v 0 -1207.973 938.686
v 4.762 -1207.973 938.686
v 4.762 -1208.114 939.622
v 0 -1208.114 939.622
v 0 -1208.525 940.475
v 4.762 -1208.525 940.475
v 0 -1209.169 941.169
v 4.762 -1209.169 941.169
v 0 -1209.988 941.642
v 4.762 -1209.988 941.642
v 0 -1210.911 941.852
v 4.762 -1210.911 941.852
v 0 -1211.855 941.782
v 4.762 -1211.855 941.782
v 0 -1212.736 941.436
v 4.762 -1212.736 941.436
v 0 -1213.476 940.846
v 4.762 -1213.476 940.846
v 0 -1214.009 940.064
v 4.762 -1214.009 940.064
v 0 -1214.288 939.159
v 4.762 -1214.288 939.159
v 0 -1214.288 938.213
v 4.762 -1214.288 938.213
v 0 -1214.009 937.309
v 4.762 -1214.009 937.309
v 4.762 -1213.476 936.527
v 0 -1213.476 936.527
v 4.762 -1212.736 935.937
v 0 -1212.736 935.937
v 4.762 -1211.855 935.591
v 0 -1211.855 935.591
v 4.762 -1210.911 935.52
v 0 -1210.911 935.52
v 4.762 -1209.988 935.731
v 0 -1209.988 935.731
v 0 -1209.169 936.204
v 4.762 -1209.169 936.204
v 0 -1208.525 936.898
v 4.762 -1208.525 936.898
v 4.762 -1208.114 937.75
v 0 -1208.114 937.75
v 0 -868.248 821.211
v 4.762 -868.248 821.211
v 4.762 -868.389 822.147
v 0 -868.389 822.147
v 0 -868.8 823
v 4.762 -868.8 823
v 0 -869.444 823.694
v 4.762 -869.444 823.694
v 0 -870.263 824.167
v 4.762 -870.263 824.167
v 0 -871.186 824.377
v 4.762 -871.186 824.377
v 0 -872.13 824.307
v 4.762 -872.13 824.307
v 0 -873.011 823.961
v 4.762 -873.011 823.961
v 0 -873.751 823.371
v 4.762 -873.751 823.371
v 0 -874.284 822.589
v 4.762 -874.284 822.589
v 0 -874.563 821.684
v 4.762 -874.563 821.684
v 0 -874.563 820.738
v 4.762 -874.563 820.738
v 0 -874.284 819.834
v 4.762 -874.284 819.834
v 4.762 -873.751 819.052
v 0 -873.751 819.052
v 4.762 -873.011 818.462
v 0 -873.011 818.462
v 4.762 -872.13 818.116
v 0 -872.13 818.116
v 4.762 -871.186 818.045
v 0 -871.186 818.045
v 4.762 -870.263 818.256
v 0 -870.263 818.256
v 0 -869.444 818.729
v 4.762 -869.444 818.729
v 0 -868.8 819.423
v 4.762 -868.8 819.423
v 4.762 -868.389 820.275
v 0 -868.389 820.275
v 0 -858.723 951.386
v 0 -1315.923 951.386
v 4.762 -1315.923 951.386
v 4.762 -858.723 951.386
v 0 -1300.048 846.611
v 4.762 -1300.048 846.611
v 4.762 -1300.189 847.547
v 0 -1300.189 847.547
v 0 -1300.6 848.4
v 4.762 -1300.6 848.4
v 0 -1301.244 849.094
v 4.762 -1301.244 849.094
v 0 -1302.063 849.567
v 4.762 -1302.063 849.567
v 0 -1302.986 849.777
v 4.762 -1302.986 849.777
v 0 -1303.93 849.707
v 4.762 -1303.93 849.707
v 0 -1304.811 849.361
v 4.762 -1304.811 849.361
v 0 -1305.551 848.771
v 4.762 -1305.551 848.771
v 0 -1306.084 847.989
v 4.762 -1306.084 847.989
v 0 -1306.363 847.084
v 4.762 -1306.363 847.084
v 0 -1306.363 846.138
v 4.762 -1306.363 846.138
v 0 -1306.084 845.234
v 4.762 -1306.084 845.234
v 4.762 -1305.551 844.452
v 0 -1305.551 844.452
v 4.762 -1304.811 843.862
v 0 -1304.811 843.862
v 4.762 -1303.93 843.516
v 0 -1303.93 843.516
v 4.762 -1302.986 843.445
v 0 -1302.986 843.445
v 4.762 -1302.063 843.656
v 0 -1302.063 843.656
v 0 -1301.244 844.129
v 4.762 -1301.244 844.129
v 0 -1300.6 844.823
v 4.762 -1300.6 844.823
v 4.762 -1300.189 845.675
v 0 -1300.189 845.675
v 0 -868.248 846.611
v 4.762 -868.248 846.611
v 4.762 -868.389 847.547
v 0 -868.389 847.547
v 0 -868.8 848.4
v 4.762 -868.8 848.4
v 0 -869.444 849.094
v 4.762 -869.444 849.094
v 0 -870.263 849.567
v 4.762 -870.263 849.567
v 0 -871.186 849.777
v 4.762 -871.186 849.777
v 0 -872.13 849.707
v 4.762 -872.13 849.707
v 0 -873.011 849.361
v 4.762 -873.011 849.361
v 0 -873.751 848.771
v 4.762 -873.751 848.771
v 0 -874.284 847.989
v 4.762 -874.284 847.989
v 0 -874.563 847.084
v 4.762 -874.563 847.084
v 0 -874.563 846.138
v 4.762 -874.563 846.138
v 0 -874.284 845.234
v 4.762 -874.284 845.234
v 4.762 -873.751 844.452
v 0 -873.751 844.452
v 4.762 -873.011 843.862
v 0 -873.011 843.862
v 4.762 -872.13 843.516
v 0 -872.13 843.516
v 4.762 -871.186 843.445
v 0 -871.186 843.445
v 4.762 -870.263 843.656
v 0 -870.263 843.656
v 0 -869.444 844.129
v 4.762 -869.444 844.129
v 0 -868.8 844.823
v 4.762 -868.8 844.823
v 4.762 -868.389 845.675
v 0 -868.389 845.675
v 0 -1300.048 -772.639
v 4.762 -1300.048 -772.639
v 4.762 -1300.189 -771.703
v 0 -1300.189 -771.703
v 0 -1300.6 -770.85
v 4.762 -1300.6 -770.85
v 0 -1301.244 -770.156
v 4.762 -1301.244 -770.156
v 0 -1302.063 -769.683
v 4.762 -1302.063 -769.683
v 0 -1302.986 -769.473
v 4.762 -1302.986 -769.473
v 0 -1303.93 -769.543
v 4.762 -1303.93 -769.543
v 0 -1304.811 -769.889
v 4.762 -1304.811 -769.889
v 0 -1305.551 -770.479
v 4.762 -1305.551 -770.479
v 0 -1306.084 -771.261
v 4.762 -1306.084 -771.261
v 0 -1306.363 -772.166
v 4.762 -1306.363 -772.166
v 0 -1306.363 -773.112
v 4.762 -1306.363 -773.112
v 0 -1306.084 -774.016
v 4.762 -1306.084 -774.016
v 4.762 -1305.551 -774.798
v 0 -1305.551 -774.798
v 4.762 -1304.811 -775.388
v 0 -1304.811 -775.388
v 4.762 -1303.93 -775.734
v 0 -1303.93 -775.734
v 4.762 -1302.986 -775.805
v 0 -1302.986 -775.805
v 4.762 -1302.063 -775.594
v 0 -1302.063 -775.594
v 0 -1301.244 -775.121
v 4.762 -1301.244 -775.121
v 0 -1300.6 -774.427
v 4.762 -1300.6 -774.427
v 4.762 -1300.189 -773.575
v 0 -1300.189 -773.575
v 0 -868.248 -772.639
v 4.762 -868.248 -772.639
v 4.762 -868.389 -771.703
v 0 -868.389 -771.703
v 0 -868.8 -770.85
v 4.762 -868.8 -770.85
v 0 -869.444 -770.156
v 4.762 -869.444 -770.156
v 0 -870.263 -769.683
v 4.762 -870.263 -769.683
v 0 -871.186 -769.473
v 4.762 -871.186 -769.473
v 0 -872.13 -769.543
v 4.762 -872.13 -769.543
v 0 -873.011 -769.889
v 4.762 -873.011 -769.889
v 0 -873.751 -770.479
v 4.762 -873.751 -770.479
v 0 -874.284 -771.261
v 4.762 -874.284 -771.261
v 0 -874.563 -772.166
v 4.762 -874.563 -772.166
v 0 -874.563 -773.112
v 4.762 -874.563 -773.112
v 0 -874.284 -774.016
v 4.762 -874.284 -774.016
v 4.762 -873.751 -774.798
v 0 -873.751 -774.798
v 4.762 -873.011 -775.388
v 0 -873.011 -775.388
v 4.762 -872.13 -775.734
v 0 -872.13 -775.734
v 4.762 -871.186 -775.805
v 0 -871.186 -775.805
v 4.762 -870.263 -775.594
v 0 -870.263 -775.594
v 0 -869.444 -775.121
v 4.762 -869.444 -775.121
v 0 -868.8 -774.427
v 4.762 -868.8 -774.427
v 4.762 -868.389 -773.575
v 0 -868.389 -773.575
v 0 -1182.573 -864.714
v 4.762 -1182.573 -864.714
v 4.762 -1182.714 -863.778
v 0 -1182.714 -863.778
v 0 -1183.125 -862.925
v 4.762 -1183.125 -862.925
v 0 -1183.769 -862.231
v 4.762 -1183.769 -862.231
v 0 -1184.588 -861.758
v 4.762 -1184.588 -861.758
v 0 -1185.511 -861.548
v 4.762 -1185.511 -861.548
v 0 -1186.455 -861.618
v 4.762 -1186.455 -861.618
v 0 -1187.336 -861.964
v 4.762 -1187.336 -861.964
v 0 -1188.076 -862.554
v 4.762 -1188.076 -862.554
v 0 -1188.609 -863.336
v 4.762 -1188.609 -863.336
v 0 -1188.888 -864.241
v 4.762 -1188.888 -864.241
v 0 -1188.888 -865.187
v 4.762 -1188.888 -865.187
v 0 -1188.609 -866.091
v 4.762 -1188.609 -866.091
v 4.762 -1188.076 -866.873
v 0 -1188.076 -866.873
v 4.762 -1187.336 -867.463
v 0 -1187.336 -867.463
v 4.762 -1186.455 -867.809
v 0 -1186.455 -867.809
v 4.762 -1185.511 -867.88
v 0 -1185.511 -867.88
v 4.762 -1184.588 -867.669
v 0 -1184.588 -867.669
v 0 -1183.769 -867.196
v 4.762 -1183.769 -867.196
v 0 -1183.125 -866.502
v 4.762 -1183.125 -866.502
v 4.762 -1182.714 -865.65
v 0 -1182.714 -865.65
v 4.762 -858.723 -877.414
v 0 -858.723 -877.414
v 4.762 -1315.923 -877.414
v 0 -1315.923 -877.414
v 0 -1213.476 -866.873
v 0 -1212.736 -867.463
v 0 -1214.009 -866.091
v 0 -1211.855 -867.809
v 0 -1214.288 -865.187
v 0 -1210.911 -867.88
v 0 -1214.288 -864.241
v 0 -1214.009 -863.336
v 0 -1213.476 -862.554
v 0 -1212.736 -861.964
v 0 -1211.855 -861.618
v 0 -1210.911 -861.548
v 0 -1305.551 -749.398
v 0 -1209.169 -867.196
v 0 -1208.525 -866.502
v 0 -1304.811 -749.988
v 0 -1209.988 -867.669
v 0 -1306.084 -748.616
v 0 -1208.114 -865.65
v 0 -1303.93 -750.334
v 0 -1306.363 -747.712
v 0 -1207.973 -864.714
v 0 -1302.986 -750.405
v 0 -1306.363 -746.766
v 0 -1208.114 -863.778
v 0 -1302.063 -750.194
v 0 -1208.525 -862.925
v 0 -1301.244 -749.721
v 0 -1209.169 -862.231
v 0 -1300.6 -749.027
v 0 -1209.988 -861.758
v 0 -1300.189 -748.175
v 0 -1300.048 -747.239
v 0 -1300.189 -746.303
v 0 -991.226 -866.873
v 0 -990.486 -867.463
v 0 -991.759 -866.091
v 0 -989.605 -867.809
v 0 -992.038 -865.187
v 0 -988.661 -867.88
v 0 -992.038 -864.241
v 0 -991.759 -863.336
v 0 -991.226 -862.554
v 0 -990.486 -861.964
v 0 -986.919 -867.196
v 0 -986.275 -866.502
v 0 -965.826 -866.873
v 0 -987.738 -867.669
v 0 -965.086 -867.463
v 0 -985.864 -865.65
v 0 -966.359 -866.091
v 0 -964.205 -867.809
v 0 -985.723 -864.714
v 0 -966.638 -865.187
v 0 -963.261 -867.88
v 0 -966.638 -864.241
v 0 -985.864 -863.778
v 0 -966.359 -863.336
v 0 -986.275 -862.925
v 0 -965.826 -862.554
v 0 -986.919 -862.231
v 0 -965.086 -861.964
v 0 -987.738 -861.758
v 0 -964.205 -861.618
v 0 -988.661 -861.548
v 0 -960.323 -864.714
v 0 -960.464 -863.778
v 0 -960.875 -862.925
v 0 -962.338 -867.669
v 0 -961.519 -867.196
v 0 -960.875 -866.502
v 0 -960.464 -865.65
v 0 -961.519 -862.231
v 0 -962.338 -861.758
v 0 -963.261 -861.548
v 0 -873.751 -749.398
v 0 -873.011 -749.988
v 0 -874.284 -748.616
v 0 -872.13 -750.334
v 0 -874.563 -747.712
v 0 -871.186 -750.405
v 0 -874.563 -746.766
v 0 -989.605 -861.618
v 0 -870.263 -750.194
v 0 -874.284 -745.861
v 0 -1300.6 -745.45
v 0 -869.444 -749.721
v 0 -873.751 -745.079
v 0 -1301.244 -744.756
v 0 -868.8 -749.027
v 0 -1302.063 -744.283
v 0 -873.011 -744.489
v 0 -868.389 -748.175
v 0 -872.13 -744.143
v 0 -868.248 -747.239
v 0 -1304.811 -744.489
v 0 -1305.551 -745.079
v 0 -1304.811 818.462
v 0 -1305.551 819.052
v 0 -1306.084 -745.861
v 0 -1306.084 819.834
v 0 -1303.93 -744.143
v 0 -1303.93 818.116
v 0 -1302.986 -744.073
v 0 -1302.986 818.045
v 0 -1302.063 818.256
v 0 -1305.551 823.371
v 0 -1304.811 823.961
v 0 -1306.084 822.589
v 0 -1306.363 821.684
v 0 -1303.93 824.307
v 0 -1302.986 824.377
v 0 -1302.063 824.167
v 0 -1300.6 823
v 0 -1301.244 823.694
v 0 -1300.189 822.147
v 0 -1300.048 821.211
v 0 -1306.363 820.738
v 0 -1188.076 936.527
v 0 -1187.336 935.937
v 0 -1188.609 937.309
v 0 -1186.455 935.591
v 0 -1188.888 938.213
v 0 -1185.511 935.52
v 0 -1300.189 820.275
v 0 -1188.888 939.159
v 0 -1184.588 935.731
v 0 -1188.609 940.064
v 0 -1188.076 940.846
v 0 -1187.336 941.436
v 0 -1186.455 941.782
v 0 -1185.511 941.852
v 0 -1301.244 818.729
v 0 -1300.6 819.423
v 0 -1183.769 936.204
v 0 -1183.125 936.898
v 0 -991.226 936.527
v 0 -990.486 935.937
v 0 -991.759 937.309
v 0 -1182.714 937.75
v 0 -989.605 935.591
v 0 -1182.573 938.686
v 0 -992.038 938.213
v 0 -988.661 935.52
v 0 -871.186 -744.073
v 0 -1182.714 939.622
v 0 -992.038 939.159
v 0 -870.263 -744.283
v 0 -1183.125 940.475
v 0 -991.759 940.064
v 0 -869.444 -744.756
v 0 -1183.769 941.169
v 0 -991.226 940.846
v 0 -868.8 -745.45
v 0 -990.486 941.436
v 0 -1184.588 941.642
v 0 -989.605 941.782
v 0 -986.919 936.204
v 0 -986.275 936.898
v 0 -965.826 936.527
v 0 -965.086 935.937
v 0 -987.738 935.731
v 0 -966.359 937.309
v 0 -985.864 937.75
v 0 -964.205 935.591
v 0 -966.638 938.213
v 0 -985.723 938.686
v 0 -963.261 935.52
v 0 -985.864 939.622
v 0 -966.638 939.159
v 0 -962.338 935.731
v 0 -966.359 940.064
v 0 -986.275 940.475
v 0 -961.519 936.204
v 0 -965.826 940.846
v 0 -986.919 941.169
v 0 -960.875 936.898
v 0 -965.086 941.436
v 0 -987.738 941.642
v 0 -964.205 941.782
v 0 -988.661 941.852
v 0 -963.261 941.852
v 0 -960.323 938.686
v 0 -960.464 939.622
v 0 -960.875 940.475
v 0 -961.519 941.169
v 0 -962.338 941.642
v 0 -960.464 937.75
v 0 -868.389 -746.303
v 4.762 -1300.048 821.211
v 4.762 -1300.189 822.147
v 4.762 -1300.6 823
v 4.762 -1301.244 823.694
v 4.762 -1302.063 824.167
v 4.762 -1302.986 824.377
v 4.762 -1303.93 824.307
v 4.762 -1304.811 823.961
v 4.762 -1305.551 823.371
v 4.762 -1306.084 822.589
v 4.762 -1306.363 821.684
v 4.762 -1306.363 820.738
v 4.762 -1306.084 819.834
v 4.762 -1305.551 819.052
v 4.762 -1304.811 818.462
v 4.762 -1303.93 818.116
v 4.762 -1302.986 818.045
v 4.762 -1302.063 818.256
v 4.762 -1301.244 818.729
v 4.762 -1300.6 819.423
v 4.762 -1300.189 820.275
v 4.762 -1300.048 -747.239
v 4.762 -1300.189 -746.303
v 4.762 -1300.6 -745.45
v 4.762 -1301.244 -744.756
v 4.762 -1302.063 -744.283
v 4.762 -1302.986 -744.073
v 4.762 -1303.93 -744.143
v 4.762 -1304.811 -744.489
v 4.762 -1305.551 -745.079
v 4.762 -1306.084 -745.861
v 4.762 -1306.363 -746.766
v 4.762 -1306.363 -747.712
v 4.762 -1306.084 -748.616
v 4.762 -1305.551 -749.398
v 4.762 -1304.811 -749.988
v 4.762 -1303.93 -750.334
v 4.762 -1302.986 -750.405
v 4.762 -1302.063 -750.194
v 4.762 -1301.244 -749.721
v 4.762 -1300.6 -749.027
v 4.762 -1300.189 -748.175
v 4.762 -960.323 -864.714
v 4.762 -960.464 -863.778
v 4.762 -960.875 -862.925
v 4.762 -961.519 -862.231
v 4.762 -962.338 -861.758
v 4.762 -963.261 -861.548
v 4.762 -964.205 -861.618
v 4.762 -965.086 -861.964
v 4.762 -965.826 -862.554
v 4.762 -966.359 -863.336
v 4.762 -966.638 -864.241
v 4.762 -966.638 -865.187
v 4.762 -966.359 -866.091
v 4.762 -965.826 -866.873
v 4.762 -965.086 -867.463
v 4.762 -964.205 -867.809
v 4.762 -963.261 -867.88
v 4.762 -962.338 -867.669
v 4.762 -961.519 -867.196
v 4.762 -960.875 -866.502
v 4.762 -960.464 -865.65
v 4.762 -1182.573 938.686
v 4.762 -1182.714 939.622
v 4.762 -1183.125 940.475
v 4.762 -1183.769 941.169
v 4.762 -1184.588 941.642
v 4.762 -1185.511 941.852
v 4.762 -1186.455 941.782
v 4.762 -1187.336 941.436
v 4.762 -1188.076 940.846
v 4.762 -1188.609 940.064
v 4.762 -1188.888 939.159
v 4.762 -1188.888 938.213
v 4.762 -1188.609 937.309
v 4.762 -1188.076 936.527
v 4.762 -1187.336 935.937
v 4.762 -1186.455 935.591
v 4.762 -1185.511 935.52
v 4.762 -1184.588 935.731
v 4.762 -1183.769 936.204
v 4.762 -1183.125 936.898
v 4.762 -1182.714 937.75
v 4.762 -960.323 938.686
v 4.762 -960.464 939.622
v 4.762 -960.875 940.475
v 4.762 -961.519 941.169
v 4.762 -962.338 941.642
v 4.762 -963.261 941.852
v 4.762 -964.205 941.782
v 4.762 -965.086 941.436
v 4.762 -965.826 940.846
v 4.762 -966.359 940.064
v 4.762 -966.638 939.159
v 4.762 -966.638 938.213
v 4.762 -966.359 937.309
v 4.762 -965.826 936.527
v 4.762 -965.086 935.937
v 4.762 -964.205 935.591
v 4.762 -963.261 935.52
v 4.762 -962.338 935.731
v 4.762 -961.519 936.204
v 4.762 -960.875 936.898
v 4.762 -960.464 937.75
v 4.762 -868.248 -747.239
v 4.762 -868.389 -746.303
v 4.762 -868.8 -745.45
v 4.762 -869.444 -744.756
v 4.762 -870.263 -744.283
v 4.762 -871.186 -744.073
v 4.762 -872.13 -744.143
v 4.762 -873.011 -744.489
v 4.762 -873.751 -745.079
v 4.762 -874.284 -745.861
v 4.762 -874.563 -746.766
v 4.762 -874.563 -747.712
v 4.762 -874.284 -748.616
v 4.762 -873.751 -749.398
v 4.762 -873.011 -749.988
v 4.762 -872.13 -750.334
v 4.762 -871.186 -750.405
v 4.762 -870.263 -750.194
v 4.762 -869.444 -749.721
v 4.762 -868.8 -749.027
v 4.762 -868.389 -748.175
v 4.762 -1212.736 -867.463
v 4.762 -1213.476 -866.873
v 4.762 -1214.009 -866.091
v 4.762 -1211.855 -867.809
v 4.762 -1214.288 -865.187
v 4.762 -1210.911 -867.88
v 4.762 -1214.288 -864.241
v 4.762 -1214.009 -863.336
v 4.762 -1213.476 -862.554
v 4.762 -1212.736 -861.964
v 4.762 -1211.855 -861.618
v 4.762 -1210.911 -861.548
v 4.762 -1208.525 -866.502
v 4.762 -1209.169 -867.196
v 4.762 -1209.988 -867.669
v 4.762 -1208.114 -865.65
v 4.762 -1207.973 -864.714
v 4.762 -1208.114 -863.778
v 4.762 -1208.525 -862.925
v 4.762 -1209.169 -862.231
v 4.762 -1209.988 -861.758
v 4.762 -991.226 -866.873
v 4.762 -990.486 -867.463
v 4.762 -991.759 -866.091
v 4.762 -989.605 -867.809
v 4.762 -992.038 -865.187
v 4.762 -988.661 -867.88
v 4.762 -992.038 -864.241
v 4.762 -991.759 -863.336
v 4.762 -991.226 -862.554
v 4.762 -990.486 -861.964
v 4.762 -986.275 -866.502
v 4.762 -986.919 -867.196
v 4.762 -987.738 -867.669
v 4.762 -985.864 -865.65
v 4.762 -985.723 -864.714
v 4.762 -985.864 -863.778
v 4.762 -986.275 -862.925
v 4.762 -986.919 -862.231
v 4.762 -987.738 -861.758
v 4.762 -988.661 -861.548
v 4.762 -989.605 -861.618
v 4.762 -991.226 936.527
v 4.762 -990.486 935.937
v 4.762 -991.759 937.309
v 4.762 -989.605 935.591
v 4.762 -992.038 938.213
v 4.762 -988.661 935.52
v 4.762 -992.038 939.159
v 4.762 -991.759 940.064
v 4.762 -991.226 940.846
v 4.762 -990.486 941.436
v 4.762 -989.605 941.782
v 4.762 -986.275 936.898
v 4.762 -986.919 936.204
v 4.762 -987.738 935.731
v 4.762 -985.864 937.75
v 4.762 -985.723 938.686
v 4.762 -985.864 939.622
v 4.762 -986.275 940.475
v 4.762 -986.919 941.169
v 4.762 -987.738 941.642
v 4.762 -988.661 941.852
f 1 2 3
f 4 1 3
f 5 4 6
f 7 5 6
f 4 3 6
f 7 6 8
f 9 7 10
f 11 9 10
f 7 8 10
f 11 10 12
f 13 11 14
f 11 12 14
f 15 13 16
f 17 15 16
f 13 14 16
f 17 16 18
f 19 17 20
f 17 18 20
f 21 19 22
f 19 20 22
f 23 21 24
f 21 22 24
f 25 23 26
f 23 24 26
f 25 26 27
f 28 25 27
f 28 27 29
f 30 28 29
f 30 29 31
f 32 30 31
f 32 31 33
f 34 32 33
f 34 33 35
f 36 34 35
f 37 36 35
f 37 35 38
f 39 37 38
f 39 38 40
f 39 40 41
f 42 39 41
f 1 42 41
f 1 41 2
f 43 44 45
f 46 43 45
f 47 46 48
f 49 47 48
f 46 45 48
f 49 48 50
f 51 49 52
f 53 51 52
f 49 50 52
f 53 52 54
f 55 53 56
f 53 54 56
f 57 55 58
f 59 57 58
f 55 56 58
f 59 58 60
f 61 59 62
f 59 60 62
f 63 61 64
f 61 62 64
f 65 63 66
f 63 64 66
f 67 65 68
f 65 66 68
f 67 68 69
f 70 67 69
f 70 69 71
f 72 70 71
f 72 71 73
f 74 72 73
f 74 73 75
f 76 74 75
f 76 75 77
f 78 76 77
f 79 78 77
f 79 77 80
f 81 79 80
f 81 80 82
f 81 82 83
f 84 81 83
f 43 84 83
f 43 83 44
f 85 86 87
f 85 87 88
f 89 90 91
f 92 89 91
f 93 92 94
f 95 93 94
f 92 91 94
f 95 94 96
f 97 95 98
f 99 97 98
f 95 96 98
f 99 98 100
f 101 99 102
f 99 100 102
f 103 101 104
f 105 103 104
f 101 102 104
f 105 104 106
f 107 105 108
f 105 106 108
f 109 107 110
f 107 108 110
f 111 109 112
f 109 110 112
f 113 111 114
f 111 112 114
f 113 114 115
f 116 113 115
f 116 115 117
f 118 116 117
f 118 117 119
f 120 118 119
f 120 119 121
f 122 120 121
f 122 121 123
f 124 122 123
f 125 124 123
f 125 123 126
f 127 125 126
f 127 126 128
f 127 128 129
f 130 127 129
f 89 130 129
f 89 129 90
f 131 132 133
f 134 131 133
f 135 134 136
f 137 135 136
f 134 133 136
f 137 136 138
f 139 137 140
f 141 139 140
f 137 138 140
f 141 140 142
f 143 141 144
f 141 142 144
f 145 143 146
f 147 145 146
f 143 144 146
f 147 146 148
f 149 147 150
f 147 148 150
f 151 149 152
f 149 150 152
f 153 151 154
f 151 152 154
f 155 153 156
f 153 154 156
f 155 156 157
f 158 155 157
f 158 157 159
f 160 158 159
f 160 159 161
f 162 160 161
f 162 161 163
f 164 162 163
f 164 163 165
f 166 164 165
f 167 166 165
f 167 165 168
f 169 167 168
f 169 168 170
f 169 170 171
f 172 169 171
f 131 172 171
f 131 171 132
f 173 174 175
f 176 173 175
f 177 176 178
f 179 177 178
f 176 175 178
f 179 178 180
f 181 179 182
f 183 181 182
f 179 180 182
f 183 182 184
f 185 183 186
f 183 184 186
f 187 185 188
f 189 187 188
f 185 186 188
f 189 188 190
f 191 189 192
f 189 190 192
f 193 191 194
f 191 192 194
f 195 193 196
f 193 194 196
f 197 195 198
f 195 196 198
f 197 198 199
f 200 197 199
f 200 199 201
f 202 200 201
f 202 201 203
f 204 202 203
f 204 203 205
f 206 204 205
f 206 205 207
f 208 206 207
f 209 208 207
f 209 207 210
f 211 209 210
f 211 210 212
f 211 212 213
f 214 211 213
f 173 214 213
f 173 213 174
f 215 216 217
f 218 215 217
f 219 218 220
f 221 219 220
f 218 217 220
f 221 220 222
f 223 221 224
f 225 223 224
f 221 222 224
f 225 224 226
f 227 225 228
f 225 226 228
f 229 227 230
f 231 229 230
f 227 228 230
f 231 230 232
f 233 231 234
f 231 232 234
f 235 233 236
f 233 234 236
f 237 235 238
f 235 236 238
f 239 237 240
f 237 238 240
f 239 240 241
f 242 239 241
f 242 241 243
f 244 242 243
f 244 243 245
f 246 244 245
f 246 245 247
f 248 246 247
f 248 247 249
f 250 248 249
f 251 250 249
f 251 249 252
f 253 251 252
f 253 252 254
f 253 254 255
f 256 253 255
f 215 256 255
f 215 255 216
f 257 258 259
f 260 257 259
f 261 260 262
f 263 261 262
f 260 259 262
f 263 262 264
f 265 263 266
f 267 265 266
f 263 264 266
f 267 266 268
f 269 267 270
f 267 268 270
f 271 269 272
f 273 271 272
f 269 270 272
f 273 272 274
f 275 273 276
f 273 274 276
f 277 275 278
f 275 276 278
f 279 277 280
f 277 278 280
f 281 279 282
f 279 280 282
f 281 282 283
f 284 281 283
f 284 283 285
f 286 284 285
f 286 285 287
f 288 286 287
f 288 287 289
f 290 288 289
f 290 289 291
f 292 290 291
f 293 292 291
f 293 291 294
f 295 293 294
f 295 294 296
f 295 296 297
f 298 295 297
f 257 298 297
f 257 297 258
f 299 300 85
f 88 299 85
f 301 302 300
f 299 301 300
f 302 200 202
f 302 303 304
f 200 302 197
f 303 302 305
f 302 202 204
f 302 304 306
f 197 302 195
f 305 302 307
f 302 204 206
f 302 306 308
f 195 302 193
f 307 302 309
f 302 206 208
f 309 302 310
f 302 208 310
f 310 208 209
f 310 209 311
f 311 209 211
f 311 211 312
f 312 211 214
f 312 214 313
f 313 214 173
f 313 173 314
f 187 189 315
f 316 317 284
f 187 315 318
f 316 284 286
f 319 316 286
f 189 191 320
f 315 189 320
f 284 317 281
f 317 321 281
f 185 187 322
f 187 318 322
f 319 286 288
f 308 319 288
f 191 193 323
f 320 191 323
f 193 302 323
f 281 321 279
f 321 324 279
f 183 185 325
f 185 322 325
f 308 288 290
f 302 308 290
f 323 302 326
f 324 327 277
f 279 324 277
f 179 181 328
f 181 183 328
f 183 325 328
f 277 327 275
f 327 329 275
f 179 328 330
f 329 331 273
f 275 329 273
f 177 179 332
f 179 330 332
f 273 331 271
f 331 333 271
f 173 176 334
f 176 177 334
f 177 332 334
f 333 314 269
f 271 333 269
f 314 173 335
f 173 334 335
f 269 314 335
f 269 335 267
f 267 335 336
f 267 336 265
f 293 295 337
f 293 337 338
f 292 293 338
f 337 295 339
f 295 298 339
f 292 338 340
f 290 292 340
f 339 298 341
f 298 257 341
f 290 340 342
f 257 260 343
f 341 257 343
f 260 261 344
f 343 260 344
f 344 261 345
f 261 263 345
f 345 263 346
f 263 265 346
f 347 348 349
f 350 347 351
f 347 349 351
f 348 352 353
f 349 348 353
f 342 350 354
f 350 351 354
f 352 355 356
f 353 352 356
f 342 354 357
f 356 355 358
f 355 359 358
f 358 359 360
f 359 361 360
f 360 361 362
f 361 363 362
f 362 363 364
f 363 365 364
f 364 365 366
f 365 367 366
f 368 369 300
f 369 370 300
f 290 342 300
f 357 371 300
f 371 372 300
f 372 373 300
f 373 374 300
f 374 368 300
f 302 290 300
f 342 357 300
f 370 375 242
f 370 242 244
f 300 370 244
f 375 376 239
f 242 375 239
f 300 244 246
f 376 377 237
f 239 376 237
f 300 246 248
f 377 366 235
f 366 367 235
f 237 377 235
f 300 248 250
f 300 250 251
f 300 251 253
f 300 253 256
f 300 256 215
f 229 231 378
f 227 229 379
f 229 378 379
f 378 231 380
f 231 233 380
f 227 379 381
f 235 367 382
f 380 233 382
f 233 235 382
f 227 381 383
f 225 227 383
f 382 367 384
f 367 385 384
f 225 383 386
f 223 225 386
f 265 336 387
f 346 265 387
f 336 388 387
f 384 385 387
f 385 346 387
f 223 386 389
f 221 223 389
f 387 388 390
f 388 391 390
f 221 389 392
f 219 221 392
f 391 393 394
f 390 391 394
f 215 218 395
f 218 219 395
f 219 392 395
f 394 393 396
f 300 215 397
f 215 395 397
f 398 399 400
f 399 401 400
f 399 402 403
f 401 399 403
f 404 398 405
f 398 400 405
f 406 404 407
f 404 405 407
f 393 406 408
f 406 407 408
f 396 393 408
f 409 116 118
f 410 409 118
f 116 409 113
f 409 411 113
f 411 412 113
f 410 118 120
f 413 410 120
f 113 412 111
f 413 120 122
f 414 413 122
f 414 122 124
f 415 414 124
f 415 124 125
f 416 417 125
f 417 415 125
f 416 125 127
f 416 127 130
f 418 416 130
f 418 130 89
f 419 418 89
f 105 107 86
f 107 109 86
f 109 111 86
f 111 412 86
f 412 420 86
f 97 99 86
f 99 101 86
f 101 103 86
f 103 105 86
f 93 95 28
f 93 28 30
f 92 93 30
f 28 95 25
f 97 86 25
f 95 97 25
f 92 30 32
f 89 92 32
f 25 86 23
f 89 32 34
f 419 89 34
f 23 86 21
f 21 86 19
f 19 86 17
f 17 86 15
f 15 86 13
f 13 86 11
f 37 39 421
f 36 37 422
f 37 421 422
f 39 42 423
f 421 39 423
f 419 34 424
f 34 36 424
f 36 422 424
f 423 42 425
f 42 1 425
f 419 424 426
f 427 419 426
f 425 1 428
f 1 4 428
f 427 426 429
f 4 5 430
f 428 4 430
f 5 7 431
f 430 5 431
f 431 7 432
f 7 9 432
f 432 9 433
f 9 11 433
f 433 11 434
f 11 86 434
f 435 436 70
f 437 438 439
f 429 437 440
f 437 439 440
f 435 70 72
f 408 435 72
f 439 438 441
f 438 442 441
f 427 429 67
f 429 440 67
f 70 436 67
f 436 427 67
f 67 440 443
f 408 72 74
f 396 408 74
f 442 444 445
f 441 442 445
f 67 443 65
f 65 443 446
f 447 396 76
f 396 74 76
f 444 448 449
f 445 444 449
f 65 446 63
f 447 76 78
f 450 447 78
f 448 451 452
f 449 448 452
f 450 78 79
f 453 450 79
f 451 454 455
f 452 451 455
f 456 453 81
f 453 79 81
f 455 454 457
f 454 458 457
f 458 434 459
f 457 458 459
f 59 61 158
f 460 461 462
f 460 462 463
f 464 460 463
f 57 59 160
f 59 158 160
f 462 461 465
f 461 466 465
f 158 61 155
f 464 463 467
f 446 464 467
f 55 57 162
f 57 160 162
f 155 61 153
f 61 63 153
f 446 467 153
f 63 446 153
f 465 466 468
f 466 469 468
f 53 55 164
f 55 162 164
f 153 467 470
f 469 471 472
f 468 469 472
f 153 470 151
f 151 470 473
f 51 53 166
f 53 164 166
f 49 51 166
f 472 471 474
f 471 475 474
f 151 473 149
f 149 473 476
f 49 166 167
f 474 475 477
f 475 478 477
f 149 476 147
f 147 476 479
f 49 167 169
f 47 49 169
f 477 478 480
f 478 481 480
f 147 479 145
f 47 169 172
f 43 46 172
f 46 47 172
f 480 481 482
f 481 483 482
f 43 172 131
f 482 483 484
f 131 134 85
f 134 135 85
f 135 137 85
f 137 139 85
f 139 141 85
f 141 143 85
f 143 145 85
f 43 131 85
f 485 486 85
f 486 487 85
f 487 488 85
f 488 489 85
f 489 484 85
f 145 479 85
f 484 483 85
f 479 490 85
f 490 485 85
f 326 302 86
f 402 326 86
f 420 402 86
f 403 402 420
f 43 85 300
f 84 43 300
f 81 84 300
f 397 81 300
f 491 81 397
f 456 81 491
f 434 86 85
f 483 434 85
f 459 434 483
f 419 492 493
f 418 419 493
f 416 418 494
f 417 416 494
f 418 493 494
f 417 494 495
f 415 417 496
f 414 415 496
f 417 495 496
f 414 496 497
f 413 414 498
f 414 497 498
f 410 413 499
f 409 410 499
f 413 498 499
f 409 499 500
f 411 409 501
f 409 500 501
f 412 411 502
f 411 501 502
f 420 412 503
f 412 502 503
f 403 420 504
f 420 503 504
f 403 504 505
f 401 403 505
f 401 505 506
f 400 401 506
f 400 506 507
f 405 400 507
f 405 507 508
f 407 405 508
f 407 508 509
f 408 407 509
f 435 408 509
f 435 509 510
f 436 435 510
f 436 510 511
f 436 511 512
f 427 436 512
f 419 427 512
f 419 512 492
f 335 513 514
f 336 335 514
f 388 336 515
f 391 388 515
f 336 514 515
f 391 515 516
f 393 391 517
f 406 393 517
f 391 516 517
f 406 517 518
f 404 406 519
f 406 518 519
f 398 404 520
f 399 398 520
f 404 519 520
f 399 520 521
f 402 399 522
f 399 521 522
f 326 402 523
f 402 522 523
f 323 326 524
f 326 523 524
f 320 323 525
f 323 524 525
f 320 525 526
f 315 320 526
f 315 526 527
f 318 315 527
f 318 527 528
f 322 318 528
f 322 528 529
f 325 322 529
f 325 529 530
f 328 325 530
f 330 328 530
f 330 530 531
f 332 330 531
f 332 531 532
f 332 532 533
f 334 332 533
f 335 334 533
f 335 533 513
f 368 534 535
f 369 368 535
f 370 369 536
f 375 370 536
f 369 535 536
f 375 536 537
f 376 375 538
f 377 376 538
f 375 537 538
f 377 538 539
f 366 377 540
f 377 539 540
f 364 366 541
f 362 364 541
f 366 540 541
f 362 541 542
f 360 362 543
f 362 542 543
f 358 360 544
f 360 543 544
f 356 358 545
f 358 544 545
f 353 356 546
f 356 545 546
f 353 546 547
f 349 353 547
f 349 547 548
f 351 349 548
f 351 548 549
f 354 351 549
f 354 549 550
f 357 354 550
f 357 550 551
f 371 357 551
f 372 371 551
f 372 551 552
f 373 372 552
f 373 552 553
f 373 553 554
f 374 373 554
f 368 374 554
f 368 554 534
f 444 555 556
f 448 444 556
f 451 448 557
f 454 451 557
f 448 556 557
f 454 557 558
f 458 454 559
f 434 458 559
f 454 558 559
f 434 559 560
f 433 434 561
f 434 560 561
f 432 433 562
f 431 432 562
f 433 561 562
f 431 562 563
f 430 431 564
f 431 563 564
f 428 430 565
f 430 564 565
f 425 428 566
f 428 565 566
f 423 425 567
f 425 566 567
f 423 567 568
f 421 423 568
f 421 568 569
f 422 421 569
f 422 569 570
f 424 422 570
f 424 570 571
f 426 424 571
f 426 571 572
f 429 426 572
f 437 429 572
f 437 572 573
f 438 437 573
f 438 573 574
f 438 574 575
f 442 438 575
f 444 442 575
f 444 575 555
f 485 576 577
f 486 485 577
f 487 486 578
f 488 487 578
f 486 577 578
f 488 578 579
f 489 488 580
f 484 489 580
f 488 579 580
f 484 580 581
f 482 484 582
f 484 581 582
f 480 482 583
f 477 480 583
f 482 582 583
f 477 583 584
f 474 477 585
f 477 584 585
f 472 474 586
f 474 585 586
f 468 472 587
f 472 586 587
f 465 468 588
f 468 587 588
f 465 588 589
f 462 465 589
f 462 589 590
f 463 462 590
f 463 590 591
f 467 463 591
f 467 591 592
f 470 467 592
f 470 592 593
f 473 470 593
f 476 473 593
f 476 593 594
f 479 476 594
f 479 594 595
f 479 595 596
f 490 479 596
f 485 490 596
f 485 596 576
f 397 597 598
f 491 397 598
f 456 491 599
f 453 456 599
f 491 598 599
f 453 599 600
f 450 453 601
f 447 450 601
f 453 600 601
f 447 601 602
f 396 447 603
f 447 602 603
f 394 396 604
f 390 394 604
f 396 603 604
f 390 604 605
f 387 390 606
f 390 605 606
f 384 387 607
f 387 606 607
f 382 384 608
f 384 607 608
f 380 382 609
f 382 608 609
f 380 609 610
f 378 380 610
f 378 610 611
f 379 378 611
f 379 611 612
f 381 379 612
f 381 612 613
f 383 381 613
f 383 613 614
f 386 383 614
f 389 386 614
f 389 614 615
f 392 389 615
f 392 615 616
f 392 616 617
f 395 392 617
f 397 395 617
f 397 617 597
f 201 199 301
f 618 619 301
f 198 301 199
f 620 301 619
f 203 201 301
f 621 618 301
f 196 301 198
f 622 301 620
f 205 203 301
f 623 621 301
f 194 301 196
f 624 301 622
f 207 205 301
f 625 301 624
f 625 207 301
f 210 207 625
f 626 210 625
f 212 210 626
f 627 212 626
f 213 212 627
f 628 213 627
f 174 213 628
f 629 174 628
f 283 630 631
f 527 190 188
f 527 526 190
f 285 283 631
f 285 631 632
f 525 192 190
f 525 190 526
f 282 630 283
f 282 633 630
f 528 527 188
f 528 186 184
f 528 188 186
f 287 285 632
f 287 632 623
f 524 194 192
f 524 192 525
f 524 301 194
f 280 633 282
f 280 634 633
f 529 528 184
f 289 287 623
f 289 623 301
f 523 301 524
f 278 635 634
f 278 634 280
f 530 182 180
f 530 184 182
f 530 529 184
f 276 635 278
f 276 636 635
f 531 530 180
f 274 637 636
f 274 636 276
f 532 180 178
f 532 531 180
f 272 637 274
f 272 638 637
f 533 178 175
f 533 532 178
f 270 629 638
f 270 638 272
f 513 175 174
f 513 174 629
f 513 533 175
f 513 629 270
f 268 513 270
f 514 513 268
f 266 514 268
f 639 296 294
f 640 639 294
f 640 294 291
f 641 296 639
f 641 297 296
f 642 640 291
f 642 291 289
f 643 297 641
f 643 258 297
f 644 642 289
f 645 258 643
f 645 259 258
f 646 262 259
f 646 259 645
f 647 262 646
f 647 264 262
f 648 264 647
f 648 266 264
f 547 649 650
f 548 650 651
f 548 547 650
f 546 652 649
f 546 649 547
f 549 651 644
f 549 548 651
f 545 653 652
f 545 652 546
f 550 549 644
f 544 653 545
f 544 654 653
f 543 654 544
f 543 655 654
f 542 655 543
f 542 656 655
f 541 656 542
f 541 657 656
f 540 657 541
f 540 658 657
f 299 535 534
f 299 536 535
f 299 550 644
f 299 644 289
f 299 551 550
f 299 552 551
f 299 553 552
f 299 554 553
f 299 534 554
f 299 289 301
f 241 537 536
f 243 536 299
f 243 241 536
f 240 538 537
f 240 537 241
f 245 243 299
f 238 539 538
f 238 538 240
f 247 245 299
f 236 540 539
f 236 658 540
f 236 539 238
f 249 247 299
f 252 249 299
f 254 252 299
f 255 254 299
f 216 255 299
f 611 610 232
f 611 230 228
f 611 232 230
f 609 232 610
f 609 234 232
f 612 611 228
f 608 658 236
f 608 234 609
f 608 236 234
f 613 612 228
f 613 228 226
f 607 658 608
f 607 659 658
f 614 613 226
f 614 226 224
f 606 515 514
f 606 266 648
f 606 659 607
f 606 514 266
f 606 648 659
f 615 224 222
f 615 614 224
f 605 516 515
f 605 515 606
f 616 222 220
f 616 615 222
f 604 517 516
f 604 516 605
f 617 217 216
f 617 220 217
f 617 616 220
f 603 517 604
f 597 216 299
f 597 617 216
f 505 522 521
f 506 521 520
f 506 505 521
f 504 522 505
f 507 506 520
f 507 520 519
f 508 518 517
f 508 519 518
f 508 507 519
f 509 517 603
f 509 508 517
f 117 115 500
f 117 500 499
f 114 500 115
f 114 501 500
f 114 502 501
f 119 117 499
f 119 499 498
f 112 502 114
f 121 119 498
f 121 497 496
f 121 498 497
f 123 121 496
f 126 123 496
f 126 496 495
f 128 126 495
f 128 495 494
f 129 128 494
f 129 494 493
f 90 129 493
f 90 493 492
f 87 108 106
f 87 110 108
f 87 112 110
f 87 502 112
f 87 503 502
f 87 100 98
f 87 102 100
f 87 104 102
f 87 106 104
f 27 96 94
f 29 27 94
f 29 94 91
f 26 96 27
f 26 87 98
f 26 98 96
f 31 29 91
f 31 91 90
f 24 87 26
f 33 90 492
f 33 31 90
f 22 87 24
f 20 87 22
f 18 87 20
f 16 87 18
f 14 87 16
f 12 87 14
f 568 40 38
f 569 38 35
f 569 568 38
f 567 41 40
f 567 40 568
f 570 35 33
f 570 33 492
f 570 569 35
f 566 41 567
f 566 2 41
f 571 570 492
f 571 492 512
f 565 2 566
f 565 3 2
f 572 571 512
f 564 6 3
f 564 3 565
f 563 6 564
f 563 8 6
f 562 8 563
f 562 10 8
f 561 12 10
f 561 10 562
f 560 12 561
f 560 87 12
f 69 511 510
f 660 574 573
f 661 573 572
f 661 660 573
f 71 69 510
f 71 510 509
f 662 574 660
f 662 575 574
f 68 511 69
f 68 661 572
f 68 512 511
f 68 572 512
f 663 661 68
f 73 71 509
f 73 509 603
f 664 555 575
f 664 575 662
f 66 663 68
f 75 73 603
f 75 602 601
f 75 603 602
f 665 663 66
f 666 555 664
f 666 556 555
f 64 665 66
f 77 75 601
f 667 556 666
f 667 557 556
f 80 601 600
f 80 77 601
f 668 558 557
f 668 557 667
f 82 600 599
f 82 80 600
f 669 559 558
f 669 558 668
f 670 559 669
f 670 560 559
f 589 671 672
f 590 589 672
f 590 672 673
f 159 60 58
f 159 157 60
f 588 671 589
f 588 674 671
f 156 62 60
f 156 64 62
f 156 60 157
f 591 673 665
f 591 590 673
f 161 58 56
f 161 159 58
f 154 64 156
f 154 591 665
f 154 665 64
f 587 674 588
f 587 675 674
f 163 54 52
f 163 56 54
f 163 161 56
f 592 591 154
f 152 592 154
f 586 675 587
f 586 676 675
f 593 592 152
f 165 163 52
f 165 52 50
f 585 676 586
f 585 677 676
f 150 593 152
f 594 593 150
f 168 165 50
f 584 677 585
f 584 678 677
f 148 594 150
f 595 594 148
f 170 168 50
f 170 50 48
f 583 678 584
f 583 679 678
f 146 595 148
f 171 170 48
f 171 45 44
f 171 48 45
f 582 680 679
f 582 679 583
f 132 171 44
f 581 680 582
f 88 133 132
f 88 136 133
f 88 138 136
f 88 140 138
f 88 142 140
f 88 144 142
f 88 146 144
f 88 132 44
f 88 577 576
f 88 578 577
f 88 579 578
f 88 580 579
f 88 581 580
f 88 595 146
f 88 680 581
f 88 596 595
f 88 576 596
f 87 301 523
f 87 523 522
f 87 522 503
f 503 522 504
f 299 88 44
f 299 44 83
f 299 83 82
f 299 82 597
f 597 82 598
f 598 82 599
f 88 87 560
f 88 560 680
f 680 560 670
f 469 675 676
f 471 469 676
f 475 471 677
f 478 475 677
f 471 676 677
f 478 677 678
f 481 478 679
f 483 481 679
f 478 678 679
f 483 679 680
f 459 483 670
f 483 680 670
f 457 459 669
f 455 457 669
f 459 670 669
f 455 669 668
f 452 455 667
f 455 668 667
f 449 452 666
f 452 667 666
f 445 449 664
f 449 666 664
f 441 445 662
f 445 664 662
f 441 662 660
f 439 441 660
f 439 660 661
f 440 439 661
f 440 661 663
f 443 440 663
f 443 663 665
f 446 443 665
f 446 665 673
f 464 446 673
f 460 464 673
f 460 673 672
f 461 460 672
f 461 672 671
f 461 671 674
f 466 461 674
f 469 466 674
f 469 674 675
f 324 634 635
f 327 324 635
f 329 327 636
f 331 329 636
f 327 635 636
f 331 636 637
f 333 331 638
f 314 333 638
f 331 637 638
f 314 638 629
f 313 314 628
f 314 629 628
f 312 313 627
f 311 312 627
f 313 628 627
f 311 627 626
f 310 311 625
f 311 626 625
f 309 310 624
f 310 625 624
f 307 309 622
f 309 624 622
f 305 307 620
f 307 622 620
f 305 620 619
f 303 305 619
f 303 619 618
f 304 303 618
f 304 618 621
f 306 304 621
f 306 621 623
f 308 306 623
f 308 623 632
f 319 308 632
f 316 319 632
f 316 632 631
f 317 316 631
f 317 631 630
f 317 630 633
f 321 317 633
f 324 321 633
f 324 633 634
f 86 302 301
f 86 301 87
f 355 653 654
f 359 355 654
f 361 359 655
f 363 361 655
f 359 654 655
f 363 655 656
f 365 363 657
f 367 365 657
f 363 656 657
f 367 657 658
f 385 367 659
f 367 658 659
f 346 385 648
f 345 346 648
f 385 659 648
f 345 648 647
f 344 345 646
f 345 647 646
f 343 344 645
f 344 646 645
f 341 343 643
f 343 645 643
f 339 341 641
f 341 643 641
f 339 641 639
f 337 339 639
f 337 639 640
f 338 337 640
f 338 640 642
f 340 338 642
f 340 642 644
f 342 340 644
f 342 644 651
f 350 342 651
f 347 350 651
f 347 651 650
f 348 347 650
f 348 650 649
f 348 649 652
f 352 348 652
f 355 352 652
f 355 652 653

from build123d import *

# Parameters (mm, degrees)
F0_W     = 457.2
F0_H     = 1828.8
F1_DEPTH = 4.7625
F2_R     = 3.175
F3_R     = 3.175
F4_R     = 3.175
F5_R     = 3.175
F6_DEPTH = 25.4


with BuildPart() as f1:
    # F0 (on Right) → F1 (new body)
    with BuildSketch(Plane.YZ):
        with Locations((-1087.323105, 36.986277)):
            Rectangle(F0_W, F0_H)
    extrude(amount=F1_DEPTH)

    # F2 (on face) + F3 (on face) + F4 (on face) + F5 (on face) → F6 (cut)
    with BuildSketch(Plane.YZ.offset(4.7625)):
        with Locations((-1303.223105, 846.611277)):
            Circle(F2_R)
        with Locations((-1303.223105, 821.211277)):
            Circle(F2_R)
        with Locations((-1211.148105, 938.686277)):
            Circle(F2_R)
        with Locations((-1185.748105, 938.686277)):
            Circle(F2_R)
    with BuildSketch(Plane.YZ.offset(4.7625)):
        with Locations((-988.898105, 938.686277)):
            Circle(F3_R)
        with Locations((-963.498105, 938.686277)):
            Circle(F3_R)
        with Locations((-871.423105, 846.611277)):
            Circle(F3_R)
        with Locations((-871.423105, 821.211277)):
            Circle(F3_R)
    with BuildSketch(Plane.YZ.offset(4.7625)):
        with Locations((-871.423105, -772.638723)):
            Circle(F4_R)
        with Locations((-871.423105, -747.238723)):
            Circle(F4_R)
        with Locations((-963.498105, -864.713723)):
            Circle(F4_R)
        with Locations((-988.898105, -864.713723)):
            Circle(F4_R)
    with BuildSketch(Plane.YZ.offset(4.7625)):
        with Locations((-1303.223105, -772.638723)):
            Circle(F5_R)
        with Locations((-1303.223105, -747.238723)):
            Circle(F5_R)
        with Locations((-1211.148105, -864.713723)):
            Circle(F5_R)
        with Locations((-1185.748105, -864.713723)):
            Circle(F5_R)
    extrude(amount=-F6_DEPTH, mode=Mode.SUBTRACT)


solid = f1.part
